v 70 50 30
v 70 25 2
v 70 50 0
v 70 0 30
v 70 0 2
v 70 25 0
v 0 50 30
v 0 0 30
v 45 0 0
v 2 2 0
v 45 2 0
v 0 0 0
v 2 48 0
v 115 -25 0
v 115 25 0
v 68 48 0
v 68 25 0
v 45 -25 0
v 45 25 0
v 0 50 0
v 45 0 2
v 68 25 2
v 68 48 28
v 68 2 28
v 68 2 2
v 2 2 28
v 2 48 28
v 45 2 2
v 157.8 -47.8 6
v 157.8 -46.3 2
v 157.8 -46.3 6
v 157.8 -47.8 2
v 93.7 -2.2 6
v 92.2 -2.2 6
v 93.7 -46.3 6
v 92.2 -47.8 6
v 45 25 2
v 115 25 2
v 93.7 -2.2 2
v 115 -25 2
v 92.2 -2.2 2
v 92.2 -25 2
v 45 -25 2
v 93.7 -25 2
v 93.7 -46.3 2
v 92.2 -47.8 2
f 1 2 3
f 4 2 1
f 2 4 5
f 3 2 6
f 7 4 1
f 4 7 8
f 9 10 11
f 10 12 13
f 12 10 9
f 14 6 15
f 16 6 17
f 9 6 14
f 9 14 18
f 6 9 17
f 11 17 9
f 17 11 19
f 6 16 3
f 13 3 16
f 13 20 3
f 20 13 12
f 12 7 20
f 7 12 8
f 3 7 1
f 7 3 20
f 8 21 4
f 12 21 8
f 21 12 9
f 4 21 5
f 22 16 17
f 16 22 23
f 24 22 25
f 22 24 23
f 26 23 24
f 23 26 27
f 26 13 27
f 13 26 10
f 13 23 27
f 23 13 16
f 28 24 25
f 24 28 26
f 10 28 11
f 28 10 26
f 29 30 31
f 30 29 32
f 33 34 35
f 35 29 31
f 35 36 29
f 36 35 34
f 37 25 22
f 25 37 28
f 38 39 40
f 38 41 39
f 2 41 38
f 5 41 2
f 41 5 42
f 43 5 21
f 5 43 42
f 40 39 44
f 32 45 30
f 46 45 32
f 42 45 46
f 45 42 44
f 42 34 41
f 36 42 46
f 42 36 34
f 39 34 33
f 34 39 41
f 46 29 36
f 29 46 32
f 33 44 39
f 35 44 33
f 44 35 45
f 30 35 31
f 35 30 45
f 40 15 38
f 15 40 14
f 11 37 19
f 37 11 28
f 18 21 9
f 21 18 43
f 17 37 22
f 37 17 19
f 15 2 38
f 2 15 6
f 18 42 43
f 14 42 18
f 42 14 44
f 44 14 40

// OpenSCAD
// Dimensions for the enclosure parts
$fn = 64;

// Part 1: Box (main enclosure)
box_width = 70;        // X
box_depth = 50;        // Y
box_height = 30;       // Z
wall_thickness = 2;      // Wall and floor thickness
floor_thickness = 2;

// Part 2: Lid (printed upside down)
lid_width = 70;      // X
lid_depth = 50;       // Y
lid_thickness = 2;     // Thickness of the lid plate
lip_thickness = 1.5;    // Wall thickness of the lip
lip_height = 4;      // Height of the lip wall
lip_outer_width = 65.6;  // Outer width of lip (must match box inner size with clearance)
lip_outer_depth = 45.6;   // Outer depth of lip

// Spacing between parts
gap = 10;

// Centering the parts on the X axis for both
box_x = -box_width / 2;
box_y = -box_depth / 2;
lid_x = box_x + box_width + gap;
lid_y = -lid_depth / 2;

// --- Box (Part 1) ---
// Outer box dimensions
outer_box = [box_width, box_depth, box_height];

// Inner cavity (to subtract from outer box)
inner_width = box_width - 2 * wall_thickness;
inner_depth = box_depth - 2 * wall_thickness;
inner_height = box_height - floor_thickness;

// Create the box: start with outer cube, subtract inner cavity
difference() {
    // Outer box (with floor)
    cube(outer_box, center = false);
    
    // Inner cavity (with floor removed from top)
    translate([wall_thickness, wall_thickness, 0]) {
        cube([inner_width, inner_depth, box_height - floor_thickness], center = false);
    }
}

// --- Lid (Part 2) ---
// Lid is printed upside down, so we build it with the lip on top
// First, create the flat lid plate
translate([lid_x, lid_y, 0]) {
    // Lid plate (on the bed)
    cube([lid_width, lid_depth, lid_thickness], center = false);
    
    // Lip: a rectangular wall around the inside of the lid
    // Outer lip size: 65.6 x 45.6 mm, centered on lid
    lip_x_offset = (lid_width - lip_outer_width) / 2;
    lip_y_offset = (lid_depth - lip_outer_depth) / 2;
    
    // Create the lip wall (extruded from a rectangle)
    translate([lid_x + lip_x_offset, lid_y + lip_y_offset, lid_thickness]) {
        // Outer rectangle for lip (to cut from)
        difference() {
            // Outer rectangle (larger than inner to allow for clearance)
            cube([lip_outer_width, lip_outer_depth, lip_height], center = false);
            
            // Inner rectangle (to subtract: creates the lip cavity)
            // Must be 0.2 mm smaller on each side to give 0.2 mm clearance
            // So inner = outer - 0.4 mm total (0.2 per side)
            inner_lip_width = lip_outer_width - 0.4;
            inner_lip_depth = lip_outer_depth - 0.4;
            
            translate([lip_thickness, lip_thickness, 0]) {
                cube([inner_lip_width, inner_lip_depth, lip_height], center = false);
            }
        }
    }
}
